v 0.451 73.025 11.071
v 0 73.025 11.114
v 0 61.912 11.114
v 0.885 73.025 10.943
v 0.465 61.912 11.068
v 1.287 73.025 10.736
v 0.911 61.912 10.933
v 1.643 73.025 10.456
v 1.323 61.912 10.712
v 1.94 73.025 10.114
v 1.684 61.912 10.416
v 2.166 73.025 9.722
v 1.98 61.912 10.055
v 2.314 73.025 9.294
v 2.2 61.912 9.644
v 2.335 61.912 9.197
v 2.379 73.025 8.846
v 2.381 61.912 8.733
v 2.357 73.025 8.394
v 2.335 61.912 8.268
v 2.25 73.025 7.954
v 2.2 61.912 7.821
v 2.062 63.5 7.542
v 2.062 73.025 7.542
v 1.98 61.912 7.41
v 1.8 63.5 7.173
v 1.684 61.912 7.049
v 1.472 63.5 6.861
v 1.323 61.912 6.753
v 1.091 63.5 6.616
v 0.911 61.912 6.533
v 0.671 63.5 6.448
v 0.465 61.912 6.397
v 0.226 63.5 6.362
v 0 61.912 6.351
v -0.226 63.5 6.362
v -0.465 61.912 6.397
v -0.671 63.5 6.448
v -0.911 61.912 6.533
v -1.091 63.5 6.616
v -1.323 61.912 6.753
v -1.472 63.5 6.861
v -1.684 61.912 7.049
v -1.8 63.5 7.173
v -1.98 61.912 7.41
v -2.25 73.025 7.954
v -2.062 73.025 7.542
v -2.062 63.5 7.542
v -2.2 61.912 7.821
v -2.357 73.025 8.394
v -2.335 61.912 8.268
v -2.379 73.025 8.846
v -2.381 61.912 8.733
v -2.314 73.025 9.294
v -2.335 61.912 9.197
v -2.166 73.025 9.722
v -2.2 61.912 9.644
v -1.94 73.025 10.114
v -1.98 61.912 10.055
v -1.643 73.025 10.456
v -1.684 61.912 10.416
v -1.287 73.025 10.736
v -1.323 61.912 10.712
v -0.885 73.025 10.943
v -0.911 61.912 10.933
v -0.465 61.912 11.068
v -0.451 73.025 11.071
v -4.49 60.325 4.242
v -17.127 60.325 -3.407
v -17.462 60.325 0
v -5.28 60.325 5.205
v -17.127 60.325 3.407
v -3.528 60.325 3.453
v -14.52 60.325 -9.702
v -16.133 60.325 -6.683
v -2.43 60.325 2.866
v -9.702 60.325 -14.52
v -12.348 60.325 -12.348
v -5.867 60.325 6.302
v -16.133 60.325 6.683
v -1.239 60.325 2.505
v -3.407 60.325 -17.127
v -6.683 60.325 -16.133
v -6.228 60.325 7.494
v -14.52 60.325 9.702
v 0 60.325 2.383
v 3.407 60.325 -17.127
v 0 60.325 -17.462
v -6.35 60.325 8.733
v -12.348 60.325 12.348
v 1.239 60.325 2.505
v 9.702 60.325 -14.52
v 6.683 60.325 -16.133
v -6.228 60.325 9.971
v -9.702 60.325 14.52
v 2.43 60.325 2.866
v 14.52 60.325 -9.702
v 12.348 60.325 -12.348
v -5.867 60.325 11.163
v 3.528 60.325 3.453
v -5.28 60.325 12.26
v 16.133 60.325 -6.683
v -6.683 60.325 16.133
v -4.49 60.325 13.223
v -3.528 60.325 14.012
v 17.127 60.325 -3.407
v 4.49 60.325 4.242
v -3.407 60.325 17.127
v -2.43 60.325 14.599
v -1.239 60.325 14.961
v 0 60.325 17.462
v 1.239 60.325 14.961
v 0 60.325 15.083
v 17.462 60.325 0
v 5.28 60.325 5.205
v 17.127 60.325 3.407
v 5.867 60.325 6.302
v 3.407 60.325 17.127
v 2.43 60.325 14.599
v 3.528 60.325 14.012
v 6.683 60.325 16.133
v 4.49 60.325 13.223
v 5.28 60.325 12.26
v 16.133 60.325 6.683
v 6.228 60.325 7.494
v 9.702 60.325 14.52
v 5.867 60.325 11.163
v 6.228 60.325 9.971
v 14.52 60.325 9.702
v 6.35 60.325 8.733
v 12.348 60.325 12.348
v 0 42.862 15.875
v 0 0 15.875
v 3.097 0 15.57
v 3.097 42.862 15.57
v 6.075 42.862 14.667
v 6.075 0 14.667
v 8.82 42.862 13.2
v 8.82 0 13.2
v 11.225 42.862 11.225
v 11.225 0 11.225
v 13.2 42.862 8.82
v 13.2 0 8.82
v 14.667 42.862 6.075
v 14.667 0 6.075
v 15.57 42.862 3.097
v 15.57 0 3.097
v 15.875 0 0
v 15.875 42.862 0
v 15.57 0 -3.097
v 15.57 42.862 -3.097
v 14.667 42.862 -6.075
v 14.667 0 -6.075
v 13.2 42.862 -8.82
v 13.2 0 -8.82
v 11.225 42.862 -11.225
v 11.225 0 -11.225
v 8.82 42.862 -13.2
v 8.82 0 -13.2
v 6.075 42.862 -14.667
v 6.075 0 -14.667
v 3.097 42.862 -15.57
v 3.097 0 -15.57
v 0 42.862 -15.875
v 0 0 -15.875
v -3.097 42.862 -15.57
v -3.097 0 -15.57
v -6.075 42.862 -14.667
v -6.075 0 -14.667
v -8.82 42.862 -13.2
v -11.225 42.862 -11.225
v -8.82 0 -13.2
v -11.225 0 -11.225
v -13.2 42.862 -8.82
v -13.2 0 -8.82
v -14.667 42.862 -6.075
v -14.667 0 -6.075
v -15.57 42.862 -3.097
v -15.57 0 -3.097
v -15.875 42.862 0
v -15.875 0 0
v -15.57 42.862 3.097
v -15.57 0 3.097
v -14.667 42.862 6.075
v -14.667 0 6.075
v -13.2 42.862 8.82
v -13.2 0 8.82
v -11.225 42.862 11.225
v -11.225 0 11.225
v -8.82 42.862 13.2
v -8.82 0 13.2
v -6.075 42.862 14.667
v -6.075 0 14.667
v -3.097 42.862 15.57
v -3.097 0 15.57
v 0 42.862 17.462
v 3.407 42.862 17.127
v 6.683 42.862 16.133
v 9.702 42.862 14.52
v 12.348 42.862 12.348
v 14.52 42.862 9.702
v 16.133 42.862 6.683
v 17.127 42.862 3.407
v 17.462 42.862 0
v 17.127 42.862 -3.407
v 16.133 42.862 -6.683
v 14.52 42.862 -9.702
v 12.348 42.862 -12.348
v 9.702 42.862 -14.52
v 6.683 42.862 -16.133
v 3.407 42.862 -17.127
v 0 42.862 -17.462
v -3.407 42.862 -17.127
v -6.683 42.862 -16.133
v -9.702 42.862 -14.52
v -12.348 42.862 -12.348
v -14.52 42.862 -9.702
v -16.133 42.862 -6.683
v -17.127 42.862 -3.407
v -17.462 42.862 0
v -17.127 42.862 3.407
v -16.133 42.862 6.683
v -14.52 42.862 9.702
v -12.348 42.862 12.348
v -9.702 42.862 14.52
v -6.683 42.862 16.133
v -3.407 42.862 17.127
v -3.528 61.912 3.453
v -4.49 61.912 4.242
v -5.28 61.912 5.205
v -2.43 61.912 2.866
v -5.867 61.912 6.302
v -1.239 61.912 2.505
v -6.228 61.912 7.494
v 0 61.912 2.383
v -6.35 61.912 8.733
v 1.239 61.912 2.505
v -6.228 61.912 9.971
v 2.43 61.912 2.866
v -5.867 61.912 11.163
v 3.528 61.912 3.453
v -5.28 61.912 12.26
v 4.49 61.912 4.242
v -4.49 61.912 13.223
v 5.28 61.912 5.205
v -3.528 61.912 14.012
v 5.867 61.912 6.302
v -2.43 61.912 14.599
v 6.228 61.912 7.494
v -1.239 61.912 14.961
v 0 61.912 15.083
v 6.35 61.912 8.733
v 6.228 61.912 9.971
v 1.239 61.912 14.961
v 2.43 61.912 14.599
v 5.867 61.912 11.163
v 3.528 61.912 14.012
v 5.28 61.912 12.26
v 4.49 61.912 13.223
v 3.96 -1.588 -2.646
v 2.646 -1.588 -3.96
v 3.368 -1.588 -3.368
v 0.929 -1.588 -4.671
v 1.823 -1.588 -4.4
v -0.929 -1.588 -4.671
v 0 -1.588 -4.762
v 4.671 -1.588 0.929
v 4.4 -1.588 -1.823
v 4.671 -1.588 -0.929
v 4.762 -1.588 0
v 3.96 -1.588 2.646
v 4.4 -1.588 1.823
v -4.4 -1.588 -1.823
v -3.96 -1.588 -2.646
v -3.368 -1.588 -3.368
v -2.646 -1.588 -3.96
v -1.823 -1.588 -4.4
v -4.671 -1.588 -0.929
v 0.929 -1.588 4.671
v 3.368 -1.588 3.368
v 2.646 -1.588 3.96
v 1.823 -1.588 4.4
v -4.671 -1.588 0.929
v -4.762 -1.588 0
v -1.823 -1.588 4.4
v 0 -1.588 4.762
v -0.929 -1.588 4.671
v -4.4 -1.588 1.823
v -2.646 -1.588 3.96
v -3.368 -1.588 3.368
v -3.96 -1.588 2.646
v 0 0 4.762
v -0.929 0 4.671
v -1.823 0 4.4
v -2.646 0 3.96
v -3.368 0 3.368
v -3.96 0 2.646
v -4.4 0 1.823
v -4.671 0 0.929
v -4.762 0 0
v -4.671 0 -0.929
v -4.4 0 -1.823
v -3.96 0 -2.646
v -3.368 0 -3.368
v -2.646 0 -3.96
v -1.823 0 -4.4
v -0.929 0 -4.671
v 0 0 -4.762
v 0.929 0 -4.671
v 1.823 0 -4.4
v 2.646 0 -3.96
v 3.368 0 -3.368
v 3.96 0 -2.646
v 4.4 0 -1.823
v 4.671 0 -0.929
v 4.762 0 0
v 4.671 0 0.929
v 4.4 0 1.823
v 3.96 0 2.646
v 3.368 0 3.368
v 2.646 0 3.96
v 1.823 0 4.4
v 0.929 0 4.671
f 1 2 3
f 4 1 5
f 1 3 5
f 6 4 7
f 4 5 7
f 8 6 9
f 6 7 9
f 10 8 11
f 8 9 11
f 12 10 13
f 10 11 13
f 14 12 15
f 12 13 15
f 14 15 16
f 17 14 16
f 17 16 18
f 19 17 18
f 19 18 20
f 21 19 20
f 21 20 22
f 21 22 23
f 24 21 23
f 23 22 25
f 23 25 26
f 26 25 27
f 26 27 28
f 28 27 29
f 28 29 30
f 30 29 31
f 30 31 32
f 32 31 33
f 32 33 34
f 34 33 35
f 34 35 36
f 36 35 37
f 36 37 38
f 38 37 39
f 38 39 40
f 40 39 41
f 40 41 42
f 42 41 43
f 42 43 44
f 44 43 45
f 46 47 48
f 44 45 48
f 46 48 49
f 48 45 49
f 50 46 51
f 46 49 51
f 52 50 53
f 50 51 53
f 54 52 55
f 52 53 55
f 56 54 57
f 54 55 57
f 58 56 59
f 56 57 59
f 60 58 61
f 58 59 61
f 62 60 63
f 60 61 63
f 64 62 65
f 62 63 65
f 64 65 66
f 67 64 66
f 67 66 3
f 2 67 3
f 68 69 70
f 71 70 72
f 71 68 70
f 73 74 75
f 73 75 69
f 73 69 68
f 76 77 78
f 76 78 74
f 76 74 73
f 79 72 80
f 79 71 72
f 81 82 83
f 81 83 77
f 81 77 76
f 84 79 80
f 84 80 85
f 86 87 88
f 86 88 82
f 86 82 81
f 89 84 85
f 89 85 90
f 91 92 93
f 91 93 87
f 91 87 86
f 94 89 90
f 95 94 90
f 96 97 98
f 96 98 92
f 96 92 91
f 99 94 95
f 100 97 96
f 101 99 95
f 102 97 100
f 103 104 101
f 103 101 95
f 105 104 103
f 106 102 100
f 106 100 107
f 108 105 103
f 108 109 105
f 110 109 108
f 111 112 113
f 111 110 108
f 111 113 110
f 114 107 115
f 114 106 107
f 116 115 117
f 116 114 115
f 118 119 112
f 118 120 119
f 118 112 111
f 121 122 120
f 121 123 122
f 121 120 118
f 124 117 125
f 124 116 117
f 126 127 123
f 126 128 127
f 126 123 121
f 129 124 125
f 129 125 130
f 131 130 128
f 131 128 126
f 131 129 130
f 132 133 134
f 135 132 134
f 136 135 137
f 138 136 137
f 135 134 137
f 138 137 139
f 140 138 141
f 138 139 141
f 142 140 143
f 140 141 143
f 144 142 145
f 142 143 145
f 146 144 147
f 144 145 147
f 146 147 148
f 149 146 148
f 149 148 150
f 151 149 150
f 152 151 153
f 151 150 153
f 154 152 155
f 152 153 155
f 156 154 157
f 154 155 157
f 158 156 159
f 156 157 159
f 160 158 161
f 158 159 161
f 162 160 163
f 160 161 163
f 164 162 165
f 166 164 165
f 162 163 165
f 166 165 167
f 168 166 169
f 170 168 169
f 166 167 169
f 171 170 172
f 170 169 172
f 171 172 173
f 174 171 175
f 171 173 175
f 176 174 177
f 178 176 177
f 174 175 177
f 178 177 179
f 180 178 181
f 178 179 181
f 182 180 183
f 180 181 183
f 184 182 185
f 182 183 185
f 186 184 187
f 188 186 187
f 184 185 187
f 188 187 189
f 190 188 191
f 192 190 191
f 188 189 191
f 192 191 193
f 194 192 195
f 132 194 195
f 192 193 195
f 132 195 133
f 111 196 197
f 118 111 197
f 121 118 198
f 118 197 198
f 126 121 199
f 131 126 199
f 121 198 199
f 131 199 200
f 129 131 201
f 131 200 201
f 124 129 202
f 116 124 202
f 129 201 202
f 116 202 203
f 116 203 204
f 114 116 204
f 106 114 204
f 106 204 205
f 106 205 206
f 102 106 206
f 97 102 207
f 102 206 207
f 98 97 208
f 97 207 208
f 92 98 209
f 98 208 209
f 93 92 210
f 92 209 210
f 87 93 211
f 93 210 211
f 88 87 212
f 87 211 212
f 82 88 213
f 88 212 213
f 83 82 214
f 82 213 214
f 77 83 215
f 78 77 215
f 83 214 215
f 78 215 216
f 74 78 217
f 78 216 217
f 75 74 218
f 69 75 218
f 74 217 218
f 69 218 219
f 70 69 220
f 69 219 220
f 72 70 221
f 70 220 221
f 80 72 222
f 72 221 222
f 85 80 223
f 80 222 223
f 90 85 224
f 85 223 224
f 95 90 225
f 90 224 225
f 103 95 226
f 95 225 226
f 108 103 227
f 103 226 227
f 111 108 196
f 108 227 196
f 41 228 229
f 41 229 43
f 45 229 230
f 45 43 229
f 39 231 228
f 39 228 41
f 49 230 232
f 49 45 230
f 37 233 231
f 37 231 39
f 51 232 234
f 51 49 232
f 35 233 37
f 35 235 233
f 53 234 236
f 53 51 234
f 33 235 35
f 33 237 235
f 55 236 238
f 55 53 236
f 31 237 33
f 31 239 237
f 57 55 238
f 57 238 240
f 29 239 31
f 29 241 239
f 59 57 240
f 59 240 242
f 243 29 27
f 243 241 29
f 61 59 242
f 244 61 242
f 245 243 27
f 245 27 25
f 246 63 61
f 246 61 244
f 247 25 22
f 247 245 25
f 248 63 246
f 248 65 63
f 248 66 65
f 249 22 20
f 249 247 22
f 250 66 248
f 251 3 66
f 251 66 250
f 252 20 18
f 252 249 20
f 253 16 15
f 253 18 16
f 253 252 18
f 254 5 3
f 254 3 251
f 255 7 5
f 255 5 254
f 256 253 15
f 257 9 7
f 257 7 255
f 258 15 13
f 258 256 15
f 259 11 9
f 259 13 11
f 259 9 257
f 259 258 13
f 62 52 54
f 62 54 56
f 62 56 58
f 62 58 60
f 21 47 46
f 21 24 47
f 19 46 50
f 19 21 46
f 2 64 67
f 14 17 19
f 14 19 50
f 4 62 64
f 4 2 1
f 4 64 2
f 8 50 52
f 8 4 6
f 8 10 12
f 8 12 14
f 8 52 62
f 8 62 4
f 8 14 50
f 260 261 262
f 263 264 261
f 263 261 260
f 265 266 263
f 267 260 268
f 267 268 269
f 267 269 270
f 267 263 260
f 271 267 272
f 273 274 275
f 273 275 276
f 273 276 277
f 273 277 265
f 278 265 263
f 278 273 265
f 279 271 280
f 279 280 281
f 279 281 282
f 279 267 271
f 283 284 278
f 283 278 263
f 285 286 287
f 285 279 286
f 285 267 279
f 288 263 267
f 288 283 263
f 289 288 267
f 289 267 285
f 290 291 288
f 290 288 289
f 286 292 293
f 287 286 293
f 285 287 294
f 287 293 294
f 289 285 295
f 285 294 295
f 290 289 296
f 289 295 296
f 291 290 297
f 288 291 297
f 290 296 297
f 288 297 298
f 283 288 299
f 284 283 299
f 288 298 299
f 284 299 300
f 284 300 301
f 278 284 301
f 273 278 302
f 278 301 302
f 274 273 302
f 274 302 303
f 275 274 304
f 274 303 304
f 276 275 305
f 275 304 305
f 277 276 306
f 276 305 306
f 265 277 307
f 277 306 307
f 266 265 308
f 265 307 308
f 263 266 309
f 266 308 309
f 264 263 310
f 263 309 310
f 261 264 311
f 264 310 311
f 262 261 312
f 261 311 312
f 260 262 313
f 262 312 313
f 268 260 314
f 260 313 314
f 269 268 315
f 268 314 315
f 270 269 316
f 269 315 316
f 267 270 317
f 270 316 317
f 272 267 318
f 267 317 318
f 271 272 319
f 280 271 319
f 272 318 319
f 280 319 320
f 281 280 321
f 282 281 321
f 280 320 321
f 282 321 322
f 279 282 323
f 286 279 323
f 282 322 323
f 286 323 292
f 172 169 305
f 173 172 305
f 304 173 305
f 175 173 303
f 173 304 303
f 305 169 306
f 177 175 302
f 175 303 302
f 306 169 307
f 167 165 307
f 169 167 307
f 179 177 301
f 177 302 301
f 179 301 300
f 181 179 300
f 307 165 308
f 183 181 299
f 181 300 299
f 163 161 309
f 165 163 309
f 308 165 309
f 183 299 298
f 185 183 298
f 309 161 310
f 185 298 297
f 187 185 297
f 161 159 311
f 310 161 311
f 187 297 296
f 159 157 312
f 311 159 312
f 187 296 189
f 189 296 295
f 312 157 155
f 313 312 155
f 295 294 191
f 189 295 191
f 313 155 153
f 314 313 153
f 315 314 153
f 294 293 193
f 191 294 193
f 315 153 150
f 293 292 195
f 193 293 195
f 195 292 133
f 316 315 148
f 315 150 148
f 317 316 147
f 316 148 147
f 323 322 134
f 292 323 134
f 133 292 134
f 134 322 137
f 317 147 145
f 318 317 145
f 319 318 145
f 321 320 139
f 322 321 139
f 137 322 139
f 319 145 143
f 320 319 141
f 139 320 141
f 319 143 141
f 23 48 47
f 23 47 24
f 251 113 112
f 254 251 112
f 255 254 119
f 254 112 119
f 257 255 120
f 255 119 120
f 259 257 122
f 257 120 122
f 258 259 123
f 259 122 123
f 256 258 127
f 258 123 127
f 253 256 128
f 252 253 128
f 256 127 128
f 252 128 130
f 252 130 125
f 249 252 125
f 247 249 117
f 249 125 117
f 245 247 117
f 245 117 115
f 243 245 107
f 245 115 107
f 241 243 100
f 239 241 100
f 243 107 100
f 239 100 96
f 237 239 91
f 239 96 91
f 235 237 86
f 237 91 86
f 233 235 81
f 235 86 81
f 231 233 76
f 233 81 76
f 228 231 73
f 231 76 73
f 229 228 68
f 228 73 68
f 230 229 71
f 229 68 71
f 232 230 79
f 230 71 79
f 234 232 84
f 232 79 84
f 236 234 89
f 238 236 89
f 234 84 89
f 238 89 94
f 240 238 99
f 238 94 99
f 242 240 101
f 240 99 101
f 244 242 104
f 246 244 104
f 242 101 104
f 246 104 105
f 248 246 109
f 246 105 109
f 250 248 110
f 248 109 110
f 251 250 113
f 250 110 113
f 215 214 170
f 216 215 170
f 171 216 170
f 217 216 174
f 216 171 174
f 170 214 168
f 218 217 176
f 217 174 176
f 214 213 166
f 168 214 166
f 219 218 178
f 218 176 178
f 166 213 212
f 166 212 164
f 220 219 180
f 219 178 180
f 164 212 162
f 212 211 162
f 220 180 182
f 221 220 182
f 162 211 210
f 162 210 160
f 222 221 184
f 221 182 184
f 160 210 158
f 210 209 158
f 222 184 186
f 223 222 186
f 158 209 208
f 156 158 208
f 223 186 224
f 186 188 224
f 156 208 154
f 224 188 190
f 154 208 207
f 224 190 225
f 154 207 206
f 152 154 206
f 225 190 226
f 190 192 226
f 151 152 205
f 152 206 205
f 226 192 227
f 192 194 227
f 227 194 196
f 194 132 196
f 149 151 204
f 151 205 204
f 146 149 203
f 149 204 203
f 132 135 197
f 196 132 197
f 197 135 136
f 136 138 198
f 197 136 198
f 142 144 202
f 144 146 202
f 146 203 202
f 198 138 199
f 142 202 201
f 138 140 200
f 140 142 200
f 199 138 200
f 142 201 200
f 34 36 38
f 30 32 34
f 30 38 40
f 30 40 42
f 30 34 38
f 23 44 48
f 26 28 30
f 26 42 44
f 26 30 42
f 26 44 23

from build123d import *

# Parameters (mm, degrees)
SKETCH1_R           = 15.875
BOSS_EXTRUDE1_DEPTH = 42.8625
SKETCH2_R           = 17.4625
BOSS_EXTRUDE2_DEPTH = 17.4625
SKETCH3_R           = 6.35
BOSS_EXTRUDE3_DEPTH = 1.5875
SKETCH4_R           = 2.38125
BOSS_EXTRUDE4_DEPTH = 11.1125
CUT_EXTRUDE1_START  = -9.525
CUT_EXTRUDE1_DEPTH  = 9.525
SKETCH6_R           = 4.7625
BOSS_EXTRUDE5_DEPTH = 1.5875


with BuildPart() as part:
    # Sketch1 → Boss-Extrude1 (new body)
    with BuildSketch(Plane(origin=(0, 0, 0), x_dir=(1, 0, 0), z_dir=(0, 1, 0))):
        with Locations(Location((0, 0, 0), (0, 0, 270))):
            Circle(SKETCH1_R)
    extrude(amount=BOSS_EXTRUDE1_DEPTH)

    # Sketch2 → Boss-Extrude2 (add)
    with BuildSketch(Plane(origin=(0, 42.8625, 0), x_dir=(1, 0, 0), z_dir=(0, 1, 0))):
        with Locations(Location((0, 0, 0), (0, 0, 270))):
            Circle(SKETCH2_R)
    extrude(amount=BOSS_EXTRUDE2_DEPTH)

    # Sketch3 → Boss-Extrude3 (add)
    with BuildSketch(Plane(origin=(0, 60.325, 0), x_dir=(1, 0, 0), z_dir=(0, 1, 0))):
        with Locations(Location((0, -8.73252, 0), (0, 0, 270))):
            Circle(SKETCH3_R)
    extrude(amount=BOSS_EXTRUDE3_DEPTH)

    # Sketch4 → Boss-Extrude4 (add)
    with BuildSketch(Plane(origin=(0, 61.9125, 0), x_dir=(1, 0, 0), z_dir=(0, 1, 0))):
        with Locations(Location((0, -8.73252, 0), (0, 0, 270))):
            Circle(SKETCH4_R)
    extrude(amount=BOSS_EXTRUDE4_DEPTH)

    # Sketch5 → Cut-Extrude1 (cut)
    with BuildSketch(Plane(origin=(0, 73.025, 0), x_dir=(1, 0, 0), z_dir=(0, 1, 0)).offset(CUT_EXTRUDE1_START)):
        with BuildLine():
            Line((-2.062222993, -7.541895), (2.062222993, -7.541895))
            ThreePointArc((2.062222993, -7.541895), (0, -6.35127), (-2.062222993, -7.541895))
        make_face()
    extrude(amount=CUT_EXTRUDE1_DEPTH, mode=Mode.SUBTRACT)

    # Sketch6 → Boss-Extrude5 (add)
    with BuildSketch(Plane.XZ):
        with Locations(Location((0, 0, 0), (0, 0, 90))):
            Circle(SKETCH6_R)
    extrude(amount=BOSS_EXTRUDE5_DEPTH)


solid = part.part
